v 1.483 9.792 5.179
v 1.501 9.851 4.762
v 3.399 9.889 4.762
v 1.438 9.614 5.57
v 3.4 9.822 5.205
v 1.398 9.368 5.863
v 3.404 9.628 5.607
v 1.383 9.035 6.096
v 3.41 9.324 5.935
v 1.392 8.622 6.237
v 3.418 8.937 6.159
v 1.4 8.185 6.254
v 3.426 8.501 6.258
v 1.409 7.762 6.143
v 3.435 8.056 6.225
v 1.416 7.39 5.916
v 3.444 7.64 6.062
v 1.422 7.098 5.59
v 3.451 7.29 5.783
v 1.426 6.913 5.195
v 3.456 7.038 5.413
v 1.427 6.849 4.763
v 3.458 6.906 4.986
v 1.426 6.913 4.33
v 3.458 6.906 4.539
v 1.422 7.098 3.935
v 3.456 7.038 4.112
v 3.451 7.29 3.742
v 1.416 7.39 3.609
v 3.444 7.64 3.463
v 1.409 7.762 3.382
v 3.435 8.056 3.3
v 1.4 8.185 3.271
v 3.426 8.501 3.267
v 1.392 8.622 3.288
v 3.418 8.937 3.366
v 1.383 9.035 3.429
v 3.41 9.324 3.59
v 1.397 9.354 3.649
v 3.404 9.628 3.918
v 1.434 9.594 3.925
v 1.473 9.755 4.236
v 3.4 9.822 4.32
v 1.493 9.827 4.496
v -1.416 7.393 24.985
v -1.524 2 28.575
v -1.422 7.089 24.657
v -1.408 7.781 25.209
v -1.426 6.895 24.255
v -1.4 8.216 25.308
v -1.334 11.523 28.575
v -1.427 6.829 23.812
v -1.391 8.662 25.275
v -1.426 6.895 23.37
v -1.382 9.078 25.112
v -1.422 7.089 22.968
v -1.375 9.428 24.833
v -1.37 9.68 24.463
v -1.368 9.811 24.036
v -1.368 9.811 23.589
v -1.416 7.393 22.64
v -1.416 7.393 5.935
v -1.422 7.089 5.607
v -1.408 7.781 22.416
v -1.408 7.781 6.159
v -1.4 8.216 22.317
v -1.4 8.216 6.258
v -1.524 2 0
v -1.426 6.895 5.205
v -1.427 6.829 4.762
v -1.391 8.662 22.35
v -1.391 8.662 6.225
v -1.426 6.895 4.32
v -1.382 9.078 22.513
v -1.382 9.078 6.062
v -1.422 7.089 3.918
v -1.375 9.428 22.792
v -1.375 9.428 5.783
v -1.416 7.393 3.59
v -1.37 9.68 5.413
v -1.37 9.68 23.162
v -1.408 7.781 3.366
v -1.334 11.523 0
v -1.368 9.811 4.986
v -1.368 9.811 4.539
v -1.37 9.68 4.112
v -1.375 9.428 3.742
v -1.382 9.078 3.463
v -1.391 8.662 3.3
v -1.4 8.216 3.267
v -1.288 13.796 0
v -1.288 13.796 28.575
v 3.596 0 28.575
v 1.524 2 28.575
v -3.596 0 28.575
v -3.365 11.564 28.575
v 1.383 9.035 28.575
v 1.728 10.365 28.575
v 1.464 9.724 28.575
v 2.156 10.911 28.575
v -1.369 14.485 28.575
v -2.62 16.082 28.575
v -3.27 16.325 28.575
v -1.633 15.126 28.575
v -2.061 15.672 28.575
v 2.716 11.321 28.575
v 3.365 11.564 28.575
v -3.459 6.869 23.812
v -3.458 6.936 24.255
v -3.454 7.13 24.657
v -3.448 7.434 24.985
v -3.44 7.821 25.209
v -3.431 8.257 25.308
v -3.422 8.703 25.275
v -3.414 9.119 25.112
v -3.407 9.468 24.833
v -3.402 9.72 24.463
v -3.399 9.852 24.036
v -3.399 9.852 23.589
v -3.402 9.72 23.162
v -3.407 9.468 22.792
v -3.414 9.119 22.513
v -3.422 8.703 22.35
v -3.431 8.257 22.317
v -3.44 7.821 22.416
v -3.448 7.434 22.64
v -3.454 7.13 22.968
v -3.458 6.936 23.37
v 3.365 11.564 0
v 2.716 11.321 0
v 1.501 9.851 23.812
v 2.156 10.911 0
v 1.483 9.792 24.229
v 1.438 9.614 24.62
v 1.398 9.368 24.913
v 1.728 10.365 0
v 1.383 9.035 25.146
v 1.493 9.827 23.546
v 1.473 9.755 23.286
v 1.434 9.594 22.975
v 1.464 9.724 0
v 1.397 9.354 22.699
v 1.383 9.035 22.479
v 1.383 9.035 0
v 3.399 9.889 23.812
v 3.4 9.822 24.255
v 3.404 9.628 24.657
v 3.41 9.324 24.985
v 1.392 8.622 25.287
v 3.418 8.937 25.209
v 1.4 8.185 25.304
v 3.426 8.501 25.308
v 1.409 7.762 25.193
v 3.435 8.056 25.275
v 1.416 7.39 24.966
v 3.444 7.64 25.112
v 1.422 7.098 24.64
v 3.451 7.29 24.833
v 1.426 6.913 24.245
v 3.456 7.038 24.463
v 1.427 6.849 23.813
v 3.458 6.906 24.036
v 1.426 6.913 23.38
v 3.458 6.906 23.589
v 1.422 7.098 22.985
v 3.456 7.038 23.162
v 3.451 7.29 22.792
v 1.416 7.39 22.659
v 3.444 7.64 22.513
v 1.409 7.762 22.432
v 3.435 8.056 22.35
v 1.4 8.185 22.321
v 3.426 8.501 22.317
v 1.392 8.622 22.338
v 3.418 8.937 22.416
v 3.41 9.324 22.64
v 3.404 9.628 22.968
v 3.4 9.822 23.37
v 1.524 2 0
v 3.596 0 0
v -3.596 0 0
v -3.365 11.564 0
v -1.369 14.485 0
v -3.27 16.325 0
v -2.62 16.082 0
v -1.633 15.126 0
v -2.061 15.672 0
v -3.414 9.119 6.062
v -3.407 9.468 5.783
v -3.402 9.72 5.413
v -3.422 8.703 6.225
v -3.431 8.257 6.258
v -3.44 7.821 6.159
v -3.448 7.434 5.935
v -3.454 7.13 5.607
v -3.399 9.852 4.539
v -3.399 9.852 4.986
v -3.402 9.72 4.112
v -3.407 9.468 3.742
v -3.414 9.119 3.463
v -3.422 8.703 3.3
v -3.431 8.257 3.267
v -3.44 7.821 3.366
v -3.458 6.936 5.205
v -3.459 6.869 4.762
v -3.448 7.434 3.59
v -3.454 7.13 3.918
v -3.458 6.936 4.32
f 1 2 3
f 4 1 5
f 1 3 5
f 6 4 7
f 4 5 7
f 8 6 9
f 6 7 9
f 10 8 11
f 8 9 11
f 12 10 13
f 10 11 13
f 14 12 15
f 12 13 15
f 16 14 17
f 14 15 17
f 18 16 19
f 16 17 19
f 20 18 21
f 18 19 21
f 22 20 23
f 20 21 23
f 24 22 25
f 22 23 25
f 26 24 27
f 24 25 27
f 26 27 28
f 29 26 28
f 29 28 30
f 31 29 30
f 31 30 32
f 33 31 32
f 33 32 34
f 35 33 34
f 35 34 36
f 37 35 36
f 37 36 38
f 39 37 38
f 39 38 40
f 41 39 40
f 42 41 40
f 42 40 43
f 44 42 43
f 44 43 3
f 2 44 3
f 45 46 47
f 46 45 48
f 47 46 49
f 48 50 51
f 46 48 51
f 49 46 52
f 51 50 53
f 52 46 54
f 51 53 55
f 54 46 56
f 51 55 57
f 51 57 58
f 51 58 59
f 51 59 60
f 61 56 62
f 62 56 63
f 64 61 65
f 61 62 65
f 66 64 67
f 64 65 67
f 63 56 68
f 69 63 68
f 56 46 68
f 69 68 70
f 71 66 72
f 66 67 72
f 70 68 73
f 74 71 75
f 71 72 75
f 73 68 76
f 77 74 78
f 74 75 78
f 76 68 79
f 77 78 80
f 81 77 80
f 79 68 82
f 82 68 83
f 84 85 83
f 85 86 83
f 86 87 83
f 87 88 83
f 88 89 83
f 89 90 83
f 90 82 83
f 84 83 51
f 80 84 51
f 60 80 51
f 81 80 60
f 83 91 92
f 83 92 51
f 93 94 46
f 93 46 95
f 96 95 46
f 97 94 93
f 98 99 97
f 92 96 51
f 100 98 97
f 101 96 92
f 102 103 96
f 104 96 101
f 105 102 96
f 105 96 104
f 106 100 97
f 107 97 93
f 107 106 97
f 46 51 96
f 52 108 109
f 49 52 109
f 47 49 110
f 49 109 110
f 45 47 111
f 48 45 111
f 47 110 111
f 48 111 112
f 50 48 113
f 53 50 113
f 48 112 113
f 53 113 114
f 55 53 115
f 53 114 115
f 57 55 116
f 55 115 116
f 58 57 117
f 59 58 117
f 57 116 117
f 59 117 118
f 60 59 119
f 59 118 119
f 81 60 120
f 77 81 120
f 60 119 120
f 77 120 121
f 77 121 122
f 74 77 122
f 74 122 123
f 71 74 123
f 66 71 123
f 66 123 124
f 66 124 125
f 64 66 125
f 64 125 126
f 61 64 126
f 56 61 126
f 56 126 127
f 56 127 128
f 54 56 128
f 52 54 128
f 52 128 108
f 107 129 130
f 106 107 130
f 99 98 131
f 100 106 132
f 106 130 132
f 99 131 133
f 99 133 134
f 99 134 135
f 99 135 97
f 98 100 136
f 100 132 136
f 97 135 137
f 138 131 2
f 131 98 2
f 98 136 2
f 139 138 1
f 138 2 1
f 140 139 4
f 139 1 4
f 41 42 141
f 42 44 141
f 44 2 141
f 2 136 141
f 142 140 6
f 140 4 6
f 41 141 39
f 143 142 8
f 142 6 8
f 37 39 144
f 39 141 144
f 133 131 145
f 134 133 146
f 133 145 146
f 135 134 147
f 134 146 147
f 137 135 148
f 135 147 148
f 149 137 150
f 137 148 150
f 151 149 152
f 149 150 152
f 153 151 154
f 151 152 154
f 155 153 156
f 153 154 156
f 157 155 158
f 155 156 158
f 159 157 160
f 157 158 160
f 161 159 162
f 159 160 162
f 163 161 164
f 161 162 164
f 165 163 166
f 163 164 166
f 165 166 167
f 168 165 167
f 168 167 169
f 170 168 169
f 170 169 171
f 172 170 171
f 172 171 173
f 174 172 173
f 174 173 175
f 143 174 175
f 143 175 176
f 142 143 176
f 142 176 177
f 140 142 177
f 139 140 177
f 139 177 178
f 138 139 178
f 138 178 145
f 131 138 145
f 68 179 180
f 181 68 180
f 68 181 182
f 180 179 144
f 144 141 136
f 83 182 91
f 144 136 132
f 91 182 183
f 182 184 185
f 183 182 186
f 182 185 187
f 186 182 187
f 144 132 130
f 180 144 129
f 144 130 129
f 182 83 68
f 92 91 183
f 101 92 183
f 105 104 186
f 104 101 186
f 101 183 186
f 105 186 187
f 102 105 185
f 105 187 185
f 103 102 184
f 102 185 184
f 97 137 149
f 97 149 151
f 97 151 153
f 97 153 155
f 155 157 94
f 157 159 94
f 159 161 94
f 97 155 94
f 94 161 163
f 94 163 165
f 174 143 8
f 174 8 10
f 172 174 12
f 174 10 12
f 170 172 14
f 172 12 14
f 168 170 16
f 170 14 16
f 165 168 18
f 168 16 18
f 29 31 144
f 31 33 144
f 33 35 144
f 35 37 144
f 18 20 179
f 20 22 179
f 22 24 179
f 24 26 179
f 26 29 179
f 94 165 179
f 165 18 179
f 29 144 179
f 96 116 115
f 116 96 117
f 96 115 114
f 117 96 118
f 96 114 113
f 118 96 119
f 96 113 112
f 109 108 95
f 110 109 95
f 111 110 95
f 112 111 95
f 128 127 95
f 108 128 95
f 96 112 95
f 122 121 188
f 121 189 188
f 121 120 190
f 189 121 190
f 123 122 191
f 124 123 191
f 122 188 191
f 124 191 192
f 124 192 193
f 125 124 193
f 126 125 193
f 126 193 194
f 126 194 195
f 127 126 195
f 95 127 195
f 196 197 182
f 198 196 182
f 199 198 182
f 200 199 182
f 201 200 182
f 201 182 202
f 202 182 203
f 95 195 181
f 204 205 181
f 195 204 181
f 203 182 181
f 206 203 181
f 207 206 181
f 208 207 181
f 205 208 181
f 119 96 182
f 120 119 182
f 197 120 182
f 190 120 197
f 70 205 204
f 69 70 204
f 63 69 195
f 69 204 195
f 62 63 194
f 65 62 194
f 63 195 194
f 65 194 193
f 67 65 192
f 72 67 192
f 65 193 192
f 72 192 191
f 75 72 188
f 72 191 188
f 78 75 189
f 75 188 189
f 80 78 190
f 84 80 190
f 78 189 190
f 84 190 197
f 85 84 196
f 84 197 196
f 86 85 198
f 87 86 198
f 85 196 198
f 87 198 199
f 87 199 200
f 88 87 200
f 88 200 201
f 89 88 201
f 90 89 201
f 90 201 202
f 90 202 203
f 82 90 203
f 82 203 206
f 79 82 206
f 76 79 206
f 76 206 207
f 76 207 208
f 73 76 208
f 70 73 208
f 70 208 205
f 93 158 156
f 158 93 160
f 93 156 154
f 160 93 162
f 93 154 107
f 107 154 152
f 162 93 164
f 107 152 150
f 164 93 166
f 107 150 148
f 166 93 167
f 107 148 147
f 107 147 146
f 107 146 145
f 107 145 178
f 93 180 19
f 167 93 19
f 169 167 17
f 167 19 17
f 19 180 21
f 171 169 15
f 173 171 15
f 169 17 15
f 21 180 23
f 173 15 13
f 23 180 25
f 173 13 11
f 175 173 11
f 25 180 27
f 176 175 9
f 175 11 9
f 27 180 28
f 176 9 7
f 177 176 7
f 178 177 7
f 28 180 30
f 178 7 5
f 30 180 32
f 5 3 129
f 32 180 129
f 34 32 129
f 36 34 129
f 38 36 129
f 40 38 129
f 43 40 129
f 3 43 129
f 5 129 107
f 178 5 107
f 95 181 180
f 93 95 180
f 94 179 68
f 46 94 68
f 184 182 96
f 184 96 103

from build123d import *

# Parameters (mm, degrees)
BOSS_EXTRUDE1_DEPTH = 28.575
CUT_EXTRUDE1_REACH  = 35.651
SKETCH2_R           = 1.5
CUT_EXTRUDE2_REACH  = 35.651
SKETCH3_R           = 1.5
FILLET1_R           = 2.54


with BuildPart() as part:
    # Sketch1 → Boss-Extrude1 (new body)
    with BuildSketch(Plane.XY):
        Polygon((-1.3335, 11.523094809), (-3.365093559, 11.563734809), (-3.596414524, 0), (3.596414524, 0), (3.365093559, 11.563734809), (1.3335, 11.523094809), (1.524, 2), (-1.524, 2), align=None)
        Polygon((-1.23825, 16.284642214), (-1.3335, 11.523094809), (-3.365093559, 11.563734809), (-3.269843559, 16.325282214), align=None)
    extrude(amount=BOSS_EXTRUDE1_DEPTH)

    # Sketch2 → Cut-Extrude1 (cut, up to next)
    with BuildSketch(Plane(origin=(3.594975959, 0.071913903, 0), x_dir=(0, 0, -1), z_dir=(0.9997999799959991, 0.01999999999999963, 0)), mode=Mode.PRIVATE) as cut_extrude1_sk1:
        with Locations(Location((-23.8125, 8.31911996, 0), (0, 0, 90))):
            Circle(SKETCH2_R)
    cut_extrude1_tool1 = extrude(cut_extrude1_sk1.sketch, amount=-CUT_EXTRUDE1_REACH, mode=Mode.PRIVATE) & part.part
    # Sketch2 → Cut-Extrude1 (cut, up to next)
    with BuildSketch(Plane(origin=(3.594975959, 0.071913903, 0), x_dir=(0, 0, -1), z_dir=(0.9997999799959991, 0.01999999999999963, 0)), mode=Mode.PRIVATE) as cut_extrude1_sk2:
        with Locations(Location((-4.7625, 8.31911996, 0), (0, 0, 90))):
            Circle(SKETCH2_R)
    cut_extrude1_tool2 = extrude(cut_extrude1_sk2.sketch, amount=-CUT_EXTRUDE1_REACH, mode=Mode.PRIVATE) & part.part
    add(cut_extrude1_tool1.solids().sort_by_distance((3.428594, 8.38937, 23.8125))[0], mode=Mode.SUBTRACT)
    add(cut_extrude1_tool2.solids().sort_by_distance((3.428594, 8.38937, 4.7625))[0], mode=Mode.SUBTRACT)

    # Sketch3 → Cut-Extrude2 (cut, up to next)
    with BuildSketch(Plane(origin=(-3.594975959, 0.071913903, 0), x_dir=(0, 0, 1), z_dir=(-0.9997999799959991, 0.019999999999999622, 0)), mode=Mode.PRIVATE) as cut_extrude2_sk1:
        with Locations(Location((4.7625, 8.29879996, 0), (0, 0, 270))):
            Circle(SKETCH3_R)
    cut_extrude2_tool1 = extrude(cut_extrude2_sk1.sketch, amount=-CUT_EXTRUDE2_REACH, mode=Mode.PRIVATE) & part.part
    # Sketch3 → Cut-Extrude2 (cut, up to next)
    with BuildSketch(Plane(origin=(-3.594975959, 0.071913903, 0), x_dir=(0, 0, 1), z_dir=(-0.9997999799959991, 0.019999999999999622, 0)), mode=Mode.PRIVATE) as cut_extrude2_sk2:
        with Locations(Location((23.8125, 8.29879996, 0), (0, 0, 270))):
            Circle(SKETCH3_R)
    cut_extrude2_tool2 = extrude(cut_extrude2_sk2.sketch, amount=-CUT_EXTRUDE2_REACH, mode=Mode.PRIVATE) & part.part
    add(cut_extrude2_tool1.solids().sort_by_distance((-3.429, 8.369054, 4.7625))[0], mode=Mode.SUBTRACT)
    add(cut_extrude2_tool2.solids().sort_by_distance((-3.429, 8.369054, 23.8125))[0], mode=Mode.SUBTRACT)

    # Fillet1
    # the kernel refuses this fillet: 2.54 mm, written as the material it takes off along each edge
    with BuildSketch(Plane(origin=(1.3335, 11.523094809, -6.221703947), x_dir=(0.9997999799960309, 0.019999999998416385, 0), z_dir=(0, 0, 1))) as fillet1_piece_1:
        with BuildLine():
            CenterArc((2.54, -2.488681579), FILLET1_R, 101.536959033, 78.463040967)
            Line((0, -2.488681579), (-0.0508, -2.488681579))
            Line((-0.0508, -2.488681579), (-0.0508, 0))
            Line((-0.0508, 0), (0, 0.0508))
            ThreePointArc((0, 0.0508), (1.016, 0.0508), (2.02184, 0.049773632))
            Line((2.02184, 0.049773632), (2.032, 0))
        make_face()
    extrude(amount=41.018407893, mode=Mode.SUBTRACT)
    with BuildSketch(Plane(origin=(-1.23825, 16.284642214, -6.221703947), x_dir=(-0.9997999799960307, 0.019999999998425156, 0), z_dir=(0, 0, 1))) as fillet1_piece_2:
        with BuildLine():
            CenterArc((2.54, 2.488681579), FILLET1_R, 180, 78.463040967)
            Line((0, 2.488681579), (-0.0508, 2.488681579))
            Line((-0.0508, 2.488681579), (-0.0508, 0))
            Line((-0.0508, 0), (0, -0.0508))
            ThreePointArc((0, -0.0508), (1.016, -0.0508), (2.02184, -0.049773632))
            Line((2.02184, -0.049773632), (2.032, 0))
        make_face()
    extrude(amount=41.018407893, mode=Mode.SUBTRACT)


solid = part.part
